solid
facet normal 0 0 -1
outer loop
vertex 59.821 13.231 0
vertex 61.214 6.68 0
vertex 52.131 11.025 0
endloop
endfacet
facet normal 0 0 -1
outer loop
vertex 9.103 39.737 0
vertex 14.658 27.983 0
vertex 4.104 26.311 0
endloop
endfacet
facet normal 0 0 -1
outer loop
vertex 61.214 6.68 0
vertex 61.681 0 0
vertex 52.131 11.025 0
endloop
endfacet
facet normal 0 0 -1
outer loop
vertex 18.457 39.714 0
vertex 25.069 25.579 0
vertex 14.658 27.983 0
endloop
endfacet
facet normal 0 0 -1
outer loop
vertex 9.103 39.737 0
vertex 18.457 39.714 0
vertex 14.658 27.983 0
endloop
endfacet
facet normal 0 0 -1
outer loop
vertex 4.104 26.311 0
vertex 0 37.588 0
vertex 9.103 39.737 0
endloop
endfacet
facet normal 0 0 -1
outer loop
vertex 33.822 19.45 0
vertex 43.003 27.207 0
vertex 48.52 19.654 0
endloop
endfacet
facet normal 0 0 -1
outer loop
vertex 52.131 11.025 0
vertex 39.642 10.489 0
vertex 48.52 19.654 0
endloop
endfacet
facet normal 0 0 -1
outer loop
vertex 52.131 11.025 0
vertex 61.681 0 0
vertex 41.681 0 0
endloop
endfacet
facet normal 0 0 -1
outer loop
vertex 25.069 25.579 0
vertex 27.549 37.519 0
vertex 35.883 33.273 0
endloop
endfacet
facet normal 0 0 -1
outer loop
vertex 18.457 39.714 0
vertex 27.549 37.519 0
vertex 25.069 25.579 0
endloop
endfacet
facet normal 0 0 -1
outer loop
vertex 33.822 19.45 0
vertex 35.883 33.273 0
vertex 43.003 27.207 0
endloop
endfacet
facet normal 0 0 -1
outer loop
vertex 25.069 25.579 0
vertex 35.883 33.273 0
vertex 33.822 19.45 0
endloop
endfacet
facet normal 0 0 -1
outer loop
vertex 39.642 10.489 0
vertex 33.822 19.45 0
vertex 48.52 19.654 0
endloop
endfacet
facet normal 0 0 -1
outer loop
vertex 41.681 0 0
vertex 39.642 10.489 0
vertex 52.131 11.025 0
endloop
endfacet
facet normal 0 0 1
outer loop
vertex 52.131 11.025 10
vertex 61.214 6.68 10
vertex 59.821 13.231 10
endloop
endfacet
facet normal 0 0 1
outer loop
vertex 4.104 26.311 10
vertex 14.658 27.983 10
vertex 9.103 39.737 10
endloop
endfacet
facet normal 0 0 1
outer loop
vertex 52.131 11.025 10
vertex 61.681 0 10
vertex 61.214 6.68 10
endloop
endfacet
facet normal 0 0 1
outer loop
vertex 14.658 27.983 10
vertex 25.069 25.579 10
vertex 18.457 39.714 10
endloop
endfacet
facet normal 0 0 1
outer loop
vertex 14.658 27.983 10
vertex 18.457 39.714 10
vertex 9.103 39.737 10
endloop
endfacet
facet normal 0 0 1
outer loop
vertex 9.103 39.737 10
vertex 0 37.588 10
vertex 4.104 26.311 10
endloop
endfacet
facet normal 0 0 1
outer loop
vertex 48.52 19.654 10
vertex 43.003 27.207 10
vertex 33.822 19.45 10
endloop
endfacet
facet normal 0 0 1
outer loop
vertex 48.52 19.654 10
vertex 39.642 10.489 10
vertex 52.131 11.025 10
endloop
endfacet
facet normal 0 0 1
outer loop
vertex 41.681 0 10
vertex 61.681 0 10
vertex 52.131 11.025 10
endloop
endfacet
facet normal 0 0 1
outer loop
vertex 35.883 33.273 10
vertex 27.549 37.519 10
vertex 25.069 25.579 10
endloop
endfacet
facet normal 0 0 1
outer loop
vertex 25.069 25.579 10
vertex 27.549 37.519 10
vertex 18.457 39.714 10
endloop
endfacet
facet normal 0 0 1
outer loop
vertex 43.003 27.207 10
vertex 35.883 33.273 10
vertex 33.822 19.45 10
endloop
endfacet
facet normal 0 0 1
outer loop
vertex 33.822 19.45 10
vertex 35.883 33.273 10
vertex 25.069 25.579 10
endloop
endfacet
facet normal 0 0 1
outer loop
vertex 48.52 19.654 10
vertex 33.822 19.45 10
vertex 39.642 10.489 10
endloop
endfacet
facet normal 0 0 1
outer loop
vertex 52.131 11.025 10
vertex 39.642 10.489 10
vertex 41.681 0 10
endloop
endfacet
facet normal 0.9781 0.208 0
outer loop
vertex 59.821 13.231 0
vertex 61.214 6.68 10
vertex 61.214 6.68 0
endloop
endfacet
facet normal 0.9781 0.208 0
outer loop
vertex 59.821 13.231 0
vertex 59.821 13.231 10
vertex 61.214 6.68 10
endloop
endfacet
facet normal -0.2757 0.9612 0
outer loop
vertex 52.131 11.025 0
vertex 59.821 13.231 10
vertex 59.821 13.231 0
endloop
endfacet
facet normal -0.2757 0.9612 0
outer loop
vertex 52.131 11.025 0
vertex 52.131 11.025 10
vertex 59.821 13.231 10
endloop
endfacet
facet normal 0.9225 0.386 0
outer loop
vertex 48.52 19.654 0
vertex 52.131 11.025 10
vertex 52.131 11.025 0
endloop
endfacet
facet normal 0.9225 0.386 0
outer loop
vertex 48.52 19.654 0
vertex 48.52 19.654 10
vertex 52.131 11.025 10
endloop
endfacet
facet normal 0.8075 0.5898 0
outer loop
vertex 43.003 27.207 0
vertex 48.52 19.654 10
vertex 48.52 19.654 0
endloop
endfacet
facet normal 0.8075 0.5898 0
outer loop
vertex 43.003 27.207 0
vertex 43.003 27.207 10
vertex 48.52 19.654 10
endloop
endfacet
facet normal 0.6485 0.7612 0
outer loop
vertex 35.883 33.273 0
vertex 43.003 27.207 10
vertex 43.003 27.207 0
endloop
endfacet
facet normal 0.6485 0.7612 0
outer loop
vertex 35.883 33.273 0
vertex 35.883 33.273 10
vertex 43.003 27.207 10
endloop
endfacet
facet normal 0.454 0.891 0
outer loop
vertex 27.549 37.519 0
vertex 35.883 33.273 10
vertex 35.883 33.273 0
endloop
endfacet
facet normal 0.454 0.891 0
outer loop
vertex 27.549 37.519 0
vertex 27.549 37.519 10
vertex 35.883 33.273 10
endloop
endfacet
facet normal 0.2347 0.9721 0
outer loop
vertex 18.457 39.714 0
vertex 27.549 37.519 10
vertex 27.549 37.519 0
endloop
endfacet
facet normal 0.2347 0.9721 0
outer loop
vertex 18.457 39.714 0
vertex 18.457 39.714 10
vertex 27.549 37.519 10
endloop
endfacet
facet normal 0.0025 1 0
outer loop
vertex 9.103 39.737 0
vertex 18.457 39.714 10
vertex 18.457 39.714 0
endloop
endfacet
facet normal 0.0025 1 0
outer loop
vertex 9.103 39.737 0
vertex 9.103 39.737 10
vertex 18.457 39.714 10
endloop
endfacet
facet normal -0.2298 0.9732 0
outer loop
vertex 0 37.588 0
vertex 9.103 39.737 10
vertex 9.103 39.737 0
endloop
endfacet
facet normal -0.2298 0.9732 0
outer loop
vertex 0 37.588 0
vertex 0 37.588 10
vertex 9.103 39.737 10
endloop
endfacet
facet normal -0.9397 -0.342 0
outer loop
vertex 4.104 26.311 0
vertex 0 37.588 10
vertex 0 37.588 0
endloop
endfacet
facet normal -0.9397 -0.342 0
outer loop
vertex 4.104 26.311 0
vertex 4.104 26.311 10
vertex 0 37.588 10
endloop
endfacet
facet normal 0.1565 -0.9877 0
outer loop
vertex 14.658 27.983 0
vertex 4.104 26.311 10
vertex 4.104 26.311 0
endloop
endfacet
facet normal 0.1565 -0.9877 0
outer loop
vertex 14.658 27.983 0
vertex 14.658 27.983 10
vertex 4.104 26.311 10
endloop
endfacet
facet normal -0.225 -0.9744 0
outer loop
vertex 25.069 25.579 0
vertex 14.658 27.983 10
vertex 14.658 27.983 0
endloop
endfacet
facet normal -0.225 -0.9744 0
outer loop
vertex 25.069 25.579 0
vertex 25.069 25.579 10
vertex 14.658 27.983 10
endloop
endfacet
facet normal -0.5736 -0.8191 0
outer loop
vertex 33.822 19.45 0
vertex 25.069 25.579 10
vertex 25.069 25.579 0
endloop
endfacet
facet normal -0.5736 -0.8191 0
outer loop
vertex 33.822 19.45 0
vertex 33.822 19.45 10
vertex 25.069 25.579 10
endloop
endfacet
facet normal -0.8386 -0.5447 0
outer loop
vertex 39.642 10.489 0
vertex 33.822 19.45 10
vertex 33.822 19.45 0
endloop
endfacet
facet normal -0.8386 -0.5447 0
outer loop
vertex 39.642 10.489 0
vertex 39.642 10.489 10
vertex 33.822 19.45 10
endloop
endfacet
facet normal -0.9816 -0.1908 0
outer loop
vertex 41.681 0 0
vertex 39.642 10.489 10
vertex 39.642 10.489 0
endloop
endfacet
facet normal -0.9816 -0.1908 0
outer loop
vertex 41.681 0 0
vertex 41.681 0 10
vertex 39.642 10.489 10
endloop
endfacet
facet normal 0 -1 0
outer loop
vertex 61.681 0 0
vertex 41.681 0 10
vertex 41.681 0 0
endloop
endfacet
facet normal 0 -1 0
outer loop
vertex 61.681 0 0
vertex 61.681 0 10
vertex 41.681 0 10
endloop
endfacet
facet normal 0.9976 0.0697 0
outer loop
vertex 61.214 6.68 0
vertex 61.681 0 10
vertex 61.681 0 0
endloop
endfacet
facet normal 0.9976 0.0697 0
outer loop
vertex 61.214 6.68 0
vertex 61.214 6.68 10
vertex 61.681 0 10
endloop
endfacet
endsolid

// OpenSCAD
$fn = 32;

// ----------------------------------------------------------------------
// Arc stop: segment, 10 mm thick
// ----------------------------------------------------------------------

// --- parameters (mm) ---
profile_height = 10;      // extrusion height
profile_points = 17;      // points of the closed outline

profile = [[61.681, 0], [61.214, 6.68], [59.821, 13.231], [52.131, 11.025], [48.52, 19.654], [43.003, 27.207], [35.883, 33.273], [27.549, 37.519], [18.457, 39.714], [9.103, 39.737], [0, 37.588], [4.104, 26.311], [14.658, 27.983], [25.069, 25.579], [33.822, 19.45], [39.642, 10.489], [41.681, 0]];  // single closed polygon, 17 points, counter clockwise

// --- the one profile operation ---
linear_extrude(height = profile_height) polygon(points = profile);
